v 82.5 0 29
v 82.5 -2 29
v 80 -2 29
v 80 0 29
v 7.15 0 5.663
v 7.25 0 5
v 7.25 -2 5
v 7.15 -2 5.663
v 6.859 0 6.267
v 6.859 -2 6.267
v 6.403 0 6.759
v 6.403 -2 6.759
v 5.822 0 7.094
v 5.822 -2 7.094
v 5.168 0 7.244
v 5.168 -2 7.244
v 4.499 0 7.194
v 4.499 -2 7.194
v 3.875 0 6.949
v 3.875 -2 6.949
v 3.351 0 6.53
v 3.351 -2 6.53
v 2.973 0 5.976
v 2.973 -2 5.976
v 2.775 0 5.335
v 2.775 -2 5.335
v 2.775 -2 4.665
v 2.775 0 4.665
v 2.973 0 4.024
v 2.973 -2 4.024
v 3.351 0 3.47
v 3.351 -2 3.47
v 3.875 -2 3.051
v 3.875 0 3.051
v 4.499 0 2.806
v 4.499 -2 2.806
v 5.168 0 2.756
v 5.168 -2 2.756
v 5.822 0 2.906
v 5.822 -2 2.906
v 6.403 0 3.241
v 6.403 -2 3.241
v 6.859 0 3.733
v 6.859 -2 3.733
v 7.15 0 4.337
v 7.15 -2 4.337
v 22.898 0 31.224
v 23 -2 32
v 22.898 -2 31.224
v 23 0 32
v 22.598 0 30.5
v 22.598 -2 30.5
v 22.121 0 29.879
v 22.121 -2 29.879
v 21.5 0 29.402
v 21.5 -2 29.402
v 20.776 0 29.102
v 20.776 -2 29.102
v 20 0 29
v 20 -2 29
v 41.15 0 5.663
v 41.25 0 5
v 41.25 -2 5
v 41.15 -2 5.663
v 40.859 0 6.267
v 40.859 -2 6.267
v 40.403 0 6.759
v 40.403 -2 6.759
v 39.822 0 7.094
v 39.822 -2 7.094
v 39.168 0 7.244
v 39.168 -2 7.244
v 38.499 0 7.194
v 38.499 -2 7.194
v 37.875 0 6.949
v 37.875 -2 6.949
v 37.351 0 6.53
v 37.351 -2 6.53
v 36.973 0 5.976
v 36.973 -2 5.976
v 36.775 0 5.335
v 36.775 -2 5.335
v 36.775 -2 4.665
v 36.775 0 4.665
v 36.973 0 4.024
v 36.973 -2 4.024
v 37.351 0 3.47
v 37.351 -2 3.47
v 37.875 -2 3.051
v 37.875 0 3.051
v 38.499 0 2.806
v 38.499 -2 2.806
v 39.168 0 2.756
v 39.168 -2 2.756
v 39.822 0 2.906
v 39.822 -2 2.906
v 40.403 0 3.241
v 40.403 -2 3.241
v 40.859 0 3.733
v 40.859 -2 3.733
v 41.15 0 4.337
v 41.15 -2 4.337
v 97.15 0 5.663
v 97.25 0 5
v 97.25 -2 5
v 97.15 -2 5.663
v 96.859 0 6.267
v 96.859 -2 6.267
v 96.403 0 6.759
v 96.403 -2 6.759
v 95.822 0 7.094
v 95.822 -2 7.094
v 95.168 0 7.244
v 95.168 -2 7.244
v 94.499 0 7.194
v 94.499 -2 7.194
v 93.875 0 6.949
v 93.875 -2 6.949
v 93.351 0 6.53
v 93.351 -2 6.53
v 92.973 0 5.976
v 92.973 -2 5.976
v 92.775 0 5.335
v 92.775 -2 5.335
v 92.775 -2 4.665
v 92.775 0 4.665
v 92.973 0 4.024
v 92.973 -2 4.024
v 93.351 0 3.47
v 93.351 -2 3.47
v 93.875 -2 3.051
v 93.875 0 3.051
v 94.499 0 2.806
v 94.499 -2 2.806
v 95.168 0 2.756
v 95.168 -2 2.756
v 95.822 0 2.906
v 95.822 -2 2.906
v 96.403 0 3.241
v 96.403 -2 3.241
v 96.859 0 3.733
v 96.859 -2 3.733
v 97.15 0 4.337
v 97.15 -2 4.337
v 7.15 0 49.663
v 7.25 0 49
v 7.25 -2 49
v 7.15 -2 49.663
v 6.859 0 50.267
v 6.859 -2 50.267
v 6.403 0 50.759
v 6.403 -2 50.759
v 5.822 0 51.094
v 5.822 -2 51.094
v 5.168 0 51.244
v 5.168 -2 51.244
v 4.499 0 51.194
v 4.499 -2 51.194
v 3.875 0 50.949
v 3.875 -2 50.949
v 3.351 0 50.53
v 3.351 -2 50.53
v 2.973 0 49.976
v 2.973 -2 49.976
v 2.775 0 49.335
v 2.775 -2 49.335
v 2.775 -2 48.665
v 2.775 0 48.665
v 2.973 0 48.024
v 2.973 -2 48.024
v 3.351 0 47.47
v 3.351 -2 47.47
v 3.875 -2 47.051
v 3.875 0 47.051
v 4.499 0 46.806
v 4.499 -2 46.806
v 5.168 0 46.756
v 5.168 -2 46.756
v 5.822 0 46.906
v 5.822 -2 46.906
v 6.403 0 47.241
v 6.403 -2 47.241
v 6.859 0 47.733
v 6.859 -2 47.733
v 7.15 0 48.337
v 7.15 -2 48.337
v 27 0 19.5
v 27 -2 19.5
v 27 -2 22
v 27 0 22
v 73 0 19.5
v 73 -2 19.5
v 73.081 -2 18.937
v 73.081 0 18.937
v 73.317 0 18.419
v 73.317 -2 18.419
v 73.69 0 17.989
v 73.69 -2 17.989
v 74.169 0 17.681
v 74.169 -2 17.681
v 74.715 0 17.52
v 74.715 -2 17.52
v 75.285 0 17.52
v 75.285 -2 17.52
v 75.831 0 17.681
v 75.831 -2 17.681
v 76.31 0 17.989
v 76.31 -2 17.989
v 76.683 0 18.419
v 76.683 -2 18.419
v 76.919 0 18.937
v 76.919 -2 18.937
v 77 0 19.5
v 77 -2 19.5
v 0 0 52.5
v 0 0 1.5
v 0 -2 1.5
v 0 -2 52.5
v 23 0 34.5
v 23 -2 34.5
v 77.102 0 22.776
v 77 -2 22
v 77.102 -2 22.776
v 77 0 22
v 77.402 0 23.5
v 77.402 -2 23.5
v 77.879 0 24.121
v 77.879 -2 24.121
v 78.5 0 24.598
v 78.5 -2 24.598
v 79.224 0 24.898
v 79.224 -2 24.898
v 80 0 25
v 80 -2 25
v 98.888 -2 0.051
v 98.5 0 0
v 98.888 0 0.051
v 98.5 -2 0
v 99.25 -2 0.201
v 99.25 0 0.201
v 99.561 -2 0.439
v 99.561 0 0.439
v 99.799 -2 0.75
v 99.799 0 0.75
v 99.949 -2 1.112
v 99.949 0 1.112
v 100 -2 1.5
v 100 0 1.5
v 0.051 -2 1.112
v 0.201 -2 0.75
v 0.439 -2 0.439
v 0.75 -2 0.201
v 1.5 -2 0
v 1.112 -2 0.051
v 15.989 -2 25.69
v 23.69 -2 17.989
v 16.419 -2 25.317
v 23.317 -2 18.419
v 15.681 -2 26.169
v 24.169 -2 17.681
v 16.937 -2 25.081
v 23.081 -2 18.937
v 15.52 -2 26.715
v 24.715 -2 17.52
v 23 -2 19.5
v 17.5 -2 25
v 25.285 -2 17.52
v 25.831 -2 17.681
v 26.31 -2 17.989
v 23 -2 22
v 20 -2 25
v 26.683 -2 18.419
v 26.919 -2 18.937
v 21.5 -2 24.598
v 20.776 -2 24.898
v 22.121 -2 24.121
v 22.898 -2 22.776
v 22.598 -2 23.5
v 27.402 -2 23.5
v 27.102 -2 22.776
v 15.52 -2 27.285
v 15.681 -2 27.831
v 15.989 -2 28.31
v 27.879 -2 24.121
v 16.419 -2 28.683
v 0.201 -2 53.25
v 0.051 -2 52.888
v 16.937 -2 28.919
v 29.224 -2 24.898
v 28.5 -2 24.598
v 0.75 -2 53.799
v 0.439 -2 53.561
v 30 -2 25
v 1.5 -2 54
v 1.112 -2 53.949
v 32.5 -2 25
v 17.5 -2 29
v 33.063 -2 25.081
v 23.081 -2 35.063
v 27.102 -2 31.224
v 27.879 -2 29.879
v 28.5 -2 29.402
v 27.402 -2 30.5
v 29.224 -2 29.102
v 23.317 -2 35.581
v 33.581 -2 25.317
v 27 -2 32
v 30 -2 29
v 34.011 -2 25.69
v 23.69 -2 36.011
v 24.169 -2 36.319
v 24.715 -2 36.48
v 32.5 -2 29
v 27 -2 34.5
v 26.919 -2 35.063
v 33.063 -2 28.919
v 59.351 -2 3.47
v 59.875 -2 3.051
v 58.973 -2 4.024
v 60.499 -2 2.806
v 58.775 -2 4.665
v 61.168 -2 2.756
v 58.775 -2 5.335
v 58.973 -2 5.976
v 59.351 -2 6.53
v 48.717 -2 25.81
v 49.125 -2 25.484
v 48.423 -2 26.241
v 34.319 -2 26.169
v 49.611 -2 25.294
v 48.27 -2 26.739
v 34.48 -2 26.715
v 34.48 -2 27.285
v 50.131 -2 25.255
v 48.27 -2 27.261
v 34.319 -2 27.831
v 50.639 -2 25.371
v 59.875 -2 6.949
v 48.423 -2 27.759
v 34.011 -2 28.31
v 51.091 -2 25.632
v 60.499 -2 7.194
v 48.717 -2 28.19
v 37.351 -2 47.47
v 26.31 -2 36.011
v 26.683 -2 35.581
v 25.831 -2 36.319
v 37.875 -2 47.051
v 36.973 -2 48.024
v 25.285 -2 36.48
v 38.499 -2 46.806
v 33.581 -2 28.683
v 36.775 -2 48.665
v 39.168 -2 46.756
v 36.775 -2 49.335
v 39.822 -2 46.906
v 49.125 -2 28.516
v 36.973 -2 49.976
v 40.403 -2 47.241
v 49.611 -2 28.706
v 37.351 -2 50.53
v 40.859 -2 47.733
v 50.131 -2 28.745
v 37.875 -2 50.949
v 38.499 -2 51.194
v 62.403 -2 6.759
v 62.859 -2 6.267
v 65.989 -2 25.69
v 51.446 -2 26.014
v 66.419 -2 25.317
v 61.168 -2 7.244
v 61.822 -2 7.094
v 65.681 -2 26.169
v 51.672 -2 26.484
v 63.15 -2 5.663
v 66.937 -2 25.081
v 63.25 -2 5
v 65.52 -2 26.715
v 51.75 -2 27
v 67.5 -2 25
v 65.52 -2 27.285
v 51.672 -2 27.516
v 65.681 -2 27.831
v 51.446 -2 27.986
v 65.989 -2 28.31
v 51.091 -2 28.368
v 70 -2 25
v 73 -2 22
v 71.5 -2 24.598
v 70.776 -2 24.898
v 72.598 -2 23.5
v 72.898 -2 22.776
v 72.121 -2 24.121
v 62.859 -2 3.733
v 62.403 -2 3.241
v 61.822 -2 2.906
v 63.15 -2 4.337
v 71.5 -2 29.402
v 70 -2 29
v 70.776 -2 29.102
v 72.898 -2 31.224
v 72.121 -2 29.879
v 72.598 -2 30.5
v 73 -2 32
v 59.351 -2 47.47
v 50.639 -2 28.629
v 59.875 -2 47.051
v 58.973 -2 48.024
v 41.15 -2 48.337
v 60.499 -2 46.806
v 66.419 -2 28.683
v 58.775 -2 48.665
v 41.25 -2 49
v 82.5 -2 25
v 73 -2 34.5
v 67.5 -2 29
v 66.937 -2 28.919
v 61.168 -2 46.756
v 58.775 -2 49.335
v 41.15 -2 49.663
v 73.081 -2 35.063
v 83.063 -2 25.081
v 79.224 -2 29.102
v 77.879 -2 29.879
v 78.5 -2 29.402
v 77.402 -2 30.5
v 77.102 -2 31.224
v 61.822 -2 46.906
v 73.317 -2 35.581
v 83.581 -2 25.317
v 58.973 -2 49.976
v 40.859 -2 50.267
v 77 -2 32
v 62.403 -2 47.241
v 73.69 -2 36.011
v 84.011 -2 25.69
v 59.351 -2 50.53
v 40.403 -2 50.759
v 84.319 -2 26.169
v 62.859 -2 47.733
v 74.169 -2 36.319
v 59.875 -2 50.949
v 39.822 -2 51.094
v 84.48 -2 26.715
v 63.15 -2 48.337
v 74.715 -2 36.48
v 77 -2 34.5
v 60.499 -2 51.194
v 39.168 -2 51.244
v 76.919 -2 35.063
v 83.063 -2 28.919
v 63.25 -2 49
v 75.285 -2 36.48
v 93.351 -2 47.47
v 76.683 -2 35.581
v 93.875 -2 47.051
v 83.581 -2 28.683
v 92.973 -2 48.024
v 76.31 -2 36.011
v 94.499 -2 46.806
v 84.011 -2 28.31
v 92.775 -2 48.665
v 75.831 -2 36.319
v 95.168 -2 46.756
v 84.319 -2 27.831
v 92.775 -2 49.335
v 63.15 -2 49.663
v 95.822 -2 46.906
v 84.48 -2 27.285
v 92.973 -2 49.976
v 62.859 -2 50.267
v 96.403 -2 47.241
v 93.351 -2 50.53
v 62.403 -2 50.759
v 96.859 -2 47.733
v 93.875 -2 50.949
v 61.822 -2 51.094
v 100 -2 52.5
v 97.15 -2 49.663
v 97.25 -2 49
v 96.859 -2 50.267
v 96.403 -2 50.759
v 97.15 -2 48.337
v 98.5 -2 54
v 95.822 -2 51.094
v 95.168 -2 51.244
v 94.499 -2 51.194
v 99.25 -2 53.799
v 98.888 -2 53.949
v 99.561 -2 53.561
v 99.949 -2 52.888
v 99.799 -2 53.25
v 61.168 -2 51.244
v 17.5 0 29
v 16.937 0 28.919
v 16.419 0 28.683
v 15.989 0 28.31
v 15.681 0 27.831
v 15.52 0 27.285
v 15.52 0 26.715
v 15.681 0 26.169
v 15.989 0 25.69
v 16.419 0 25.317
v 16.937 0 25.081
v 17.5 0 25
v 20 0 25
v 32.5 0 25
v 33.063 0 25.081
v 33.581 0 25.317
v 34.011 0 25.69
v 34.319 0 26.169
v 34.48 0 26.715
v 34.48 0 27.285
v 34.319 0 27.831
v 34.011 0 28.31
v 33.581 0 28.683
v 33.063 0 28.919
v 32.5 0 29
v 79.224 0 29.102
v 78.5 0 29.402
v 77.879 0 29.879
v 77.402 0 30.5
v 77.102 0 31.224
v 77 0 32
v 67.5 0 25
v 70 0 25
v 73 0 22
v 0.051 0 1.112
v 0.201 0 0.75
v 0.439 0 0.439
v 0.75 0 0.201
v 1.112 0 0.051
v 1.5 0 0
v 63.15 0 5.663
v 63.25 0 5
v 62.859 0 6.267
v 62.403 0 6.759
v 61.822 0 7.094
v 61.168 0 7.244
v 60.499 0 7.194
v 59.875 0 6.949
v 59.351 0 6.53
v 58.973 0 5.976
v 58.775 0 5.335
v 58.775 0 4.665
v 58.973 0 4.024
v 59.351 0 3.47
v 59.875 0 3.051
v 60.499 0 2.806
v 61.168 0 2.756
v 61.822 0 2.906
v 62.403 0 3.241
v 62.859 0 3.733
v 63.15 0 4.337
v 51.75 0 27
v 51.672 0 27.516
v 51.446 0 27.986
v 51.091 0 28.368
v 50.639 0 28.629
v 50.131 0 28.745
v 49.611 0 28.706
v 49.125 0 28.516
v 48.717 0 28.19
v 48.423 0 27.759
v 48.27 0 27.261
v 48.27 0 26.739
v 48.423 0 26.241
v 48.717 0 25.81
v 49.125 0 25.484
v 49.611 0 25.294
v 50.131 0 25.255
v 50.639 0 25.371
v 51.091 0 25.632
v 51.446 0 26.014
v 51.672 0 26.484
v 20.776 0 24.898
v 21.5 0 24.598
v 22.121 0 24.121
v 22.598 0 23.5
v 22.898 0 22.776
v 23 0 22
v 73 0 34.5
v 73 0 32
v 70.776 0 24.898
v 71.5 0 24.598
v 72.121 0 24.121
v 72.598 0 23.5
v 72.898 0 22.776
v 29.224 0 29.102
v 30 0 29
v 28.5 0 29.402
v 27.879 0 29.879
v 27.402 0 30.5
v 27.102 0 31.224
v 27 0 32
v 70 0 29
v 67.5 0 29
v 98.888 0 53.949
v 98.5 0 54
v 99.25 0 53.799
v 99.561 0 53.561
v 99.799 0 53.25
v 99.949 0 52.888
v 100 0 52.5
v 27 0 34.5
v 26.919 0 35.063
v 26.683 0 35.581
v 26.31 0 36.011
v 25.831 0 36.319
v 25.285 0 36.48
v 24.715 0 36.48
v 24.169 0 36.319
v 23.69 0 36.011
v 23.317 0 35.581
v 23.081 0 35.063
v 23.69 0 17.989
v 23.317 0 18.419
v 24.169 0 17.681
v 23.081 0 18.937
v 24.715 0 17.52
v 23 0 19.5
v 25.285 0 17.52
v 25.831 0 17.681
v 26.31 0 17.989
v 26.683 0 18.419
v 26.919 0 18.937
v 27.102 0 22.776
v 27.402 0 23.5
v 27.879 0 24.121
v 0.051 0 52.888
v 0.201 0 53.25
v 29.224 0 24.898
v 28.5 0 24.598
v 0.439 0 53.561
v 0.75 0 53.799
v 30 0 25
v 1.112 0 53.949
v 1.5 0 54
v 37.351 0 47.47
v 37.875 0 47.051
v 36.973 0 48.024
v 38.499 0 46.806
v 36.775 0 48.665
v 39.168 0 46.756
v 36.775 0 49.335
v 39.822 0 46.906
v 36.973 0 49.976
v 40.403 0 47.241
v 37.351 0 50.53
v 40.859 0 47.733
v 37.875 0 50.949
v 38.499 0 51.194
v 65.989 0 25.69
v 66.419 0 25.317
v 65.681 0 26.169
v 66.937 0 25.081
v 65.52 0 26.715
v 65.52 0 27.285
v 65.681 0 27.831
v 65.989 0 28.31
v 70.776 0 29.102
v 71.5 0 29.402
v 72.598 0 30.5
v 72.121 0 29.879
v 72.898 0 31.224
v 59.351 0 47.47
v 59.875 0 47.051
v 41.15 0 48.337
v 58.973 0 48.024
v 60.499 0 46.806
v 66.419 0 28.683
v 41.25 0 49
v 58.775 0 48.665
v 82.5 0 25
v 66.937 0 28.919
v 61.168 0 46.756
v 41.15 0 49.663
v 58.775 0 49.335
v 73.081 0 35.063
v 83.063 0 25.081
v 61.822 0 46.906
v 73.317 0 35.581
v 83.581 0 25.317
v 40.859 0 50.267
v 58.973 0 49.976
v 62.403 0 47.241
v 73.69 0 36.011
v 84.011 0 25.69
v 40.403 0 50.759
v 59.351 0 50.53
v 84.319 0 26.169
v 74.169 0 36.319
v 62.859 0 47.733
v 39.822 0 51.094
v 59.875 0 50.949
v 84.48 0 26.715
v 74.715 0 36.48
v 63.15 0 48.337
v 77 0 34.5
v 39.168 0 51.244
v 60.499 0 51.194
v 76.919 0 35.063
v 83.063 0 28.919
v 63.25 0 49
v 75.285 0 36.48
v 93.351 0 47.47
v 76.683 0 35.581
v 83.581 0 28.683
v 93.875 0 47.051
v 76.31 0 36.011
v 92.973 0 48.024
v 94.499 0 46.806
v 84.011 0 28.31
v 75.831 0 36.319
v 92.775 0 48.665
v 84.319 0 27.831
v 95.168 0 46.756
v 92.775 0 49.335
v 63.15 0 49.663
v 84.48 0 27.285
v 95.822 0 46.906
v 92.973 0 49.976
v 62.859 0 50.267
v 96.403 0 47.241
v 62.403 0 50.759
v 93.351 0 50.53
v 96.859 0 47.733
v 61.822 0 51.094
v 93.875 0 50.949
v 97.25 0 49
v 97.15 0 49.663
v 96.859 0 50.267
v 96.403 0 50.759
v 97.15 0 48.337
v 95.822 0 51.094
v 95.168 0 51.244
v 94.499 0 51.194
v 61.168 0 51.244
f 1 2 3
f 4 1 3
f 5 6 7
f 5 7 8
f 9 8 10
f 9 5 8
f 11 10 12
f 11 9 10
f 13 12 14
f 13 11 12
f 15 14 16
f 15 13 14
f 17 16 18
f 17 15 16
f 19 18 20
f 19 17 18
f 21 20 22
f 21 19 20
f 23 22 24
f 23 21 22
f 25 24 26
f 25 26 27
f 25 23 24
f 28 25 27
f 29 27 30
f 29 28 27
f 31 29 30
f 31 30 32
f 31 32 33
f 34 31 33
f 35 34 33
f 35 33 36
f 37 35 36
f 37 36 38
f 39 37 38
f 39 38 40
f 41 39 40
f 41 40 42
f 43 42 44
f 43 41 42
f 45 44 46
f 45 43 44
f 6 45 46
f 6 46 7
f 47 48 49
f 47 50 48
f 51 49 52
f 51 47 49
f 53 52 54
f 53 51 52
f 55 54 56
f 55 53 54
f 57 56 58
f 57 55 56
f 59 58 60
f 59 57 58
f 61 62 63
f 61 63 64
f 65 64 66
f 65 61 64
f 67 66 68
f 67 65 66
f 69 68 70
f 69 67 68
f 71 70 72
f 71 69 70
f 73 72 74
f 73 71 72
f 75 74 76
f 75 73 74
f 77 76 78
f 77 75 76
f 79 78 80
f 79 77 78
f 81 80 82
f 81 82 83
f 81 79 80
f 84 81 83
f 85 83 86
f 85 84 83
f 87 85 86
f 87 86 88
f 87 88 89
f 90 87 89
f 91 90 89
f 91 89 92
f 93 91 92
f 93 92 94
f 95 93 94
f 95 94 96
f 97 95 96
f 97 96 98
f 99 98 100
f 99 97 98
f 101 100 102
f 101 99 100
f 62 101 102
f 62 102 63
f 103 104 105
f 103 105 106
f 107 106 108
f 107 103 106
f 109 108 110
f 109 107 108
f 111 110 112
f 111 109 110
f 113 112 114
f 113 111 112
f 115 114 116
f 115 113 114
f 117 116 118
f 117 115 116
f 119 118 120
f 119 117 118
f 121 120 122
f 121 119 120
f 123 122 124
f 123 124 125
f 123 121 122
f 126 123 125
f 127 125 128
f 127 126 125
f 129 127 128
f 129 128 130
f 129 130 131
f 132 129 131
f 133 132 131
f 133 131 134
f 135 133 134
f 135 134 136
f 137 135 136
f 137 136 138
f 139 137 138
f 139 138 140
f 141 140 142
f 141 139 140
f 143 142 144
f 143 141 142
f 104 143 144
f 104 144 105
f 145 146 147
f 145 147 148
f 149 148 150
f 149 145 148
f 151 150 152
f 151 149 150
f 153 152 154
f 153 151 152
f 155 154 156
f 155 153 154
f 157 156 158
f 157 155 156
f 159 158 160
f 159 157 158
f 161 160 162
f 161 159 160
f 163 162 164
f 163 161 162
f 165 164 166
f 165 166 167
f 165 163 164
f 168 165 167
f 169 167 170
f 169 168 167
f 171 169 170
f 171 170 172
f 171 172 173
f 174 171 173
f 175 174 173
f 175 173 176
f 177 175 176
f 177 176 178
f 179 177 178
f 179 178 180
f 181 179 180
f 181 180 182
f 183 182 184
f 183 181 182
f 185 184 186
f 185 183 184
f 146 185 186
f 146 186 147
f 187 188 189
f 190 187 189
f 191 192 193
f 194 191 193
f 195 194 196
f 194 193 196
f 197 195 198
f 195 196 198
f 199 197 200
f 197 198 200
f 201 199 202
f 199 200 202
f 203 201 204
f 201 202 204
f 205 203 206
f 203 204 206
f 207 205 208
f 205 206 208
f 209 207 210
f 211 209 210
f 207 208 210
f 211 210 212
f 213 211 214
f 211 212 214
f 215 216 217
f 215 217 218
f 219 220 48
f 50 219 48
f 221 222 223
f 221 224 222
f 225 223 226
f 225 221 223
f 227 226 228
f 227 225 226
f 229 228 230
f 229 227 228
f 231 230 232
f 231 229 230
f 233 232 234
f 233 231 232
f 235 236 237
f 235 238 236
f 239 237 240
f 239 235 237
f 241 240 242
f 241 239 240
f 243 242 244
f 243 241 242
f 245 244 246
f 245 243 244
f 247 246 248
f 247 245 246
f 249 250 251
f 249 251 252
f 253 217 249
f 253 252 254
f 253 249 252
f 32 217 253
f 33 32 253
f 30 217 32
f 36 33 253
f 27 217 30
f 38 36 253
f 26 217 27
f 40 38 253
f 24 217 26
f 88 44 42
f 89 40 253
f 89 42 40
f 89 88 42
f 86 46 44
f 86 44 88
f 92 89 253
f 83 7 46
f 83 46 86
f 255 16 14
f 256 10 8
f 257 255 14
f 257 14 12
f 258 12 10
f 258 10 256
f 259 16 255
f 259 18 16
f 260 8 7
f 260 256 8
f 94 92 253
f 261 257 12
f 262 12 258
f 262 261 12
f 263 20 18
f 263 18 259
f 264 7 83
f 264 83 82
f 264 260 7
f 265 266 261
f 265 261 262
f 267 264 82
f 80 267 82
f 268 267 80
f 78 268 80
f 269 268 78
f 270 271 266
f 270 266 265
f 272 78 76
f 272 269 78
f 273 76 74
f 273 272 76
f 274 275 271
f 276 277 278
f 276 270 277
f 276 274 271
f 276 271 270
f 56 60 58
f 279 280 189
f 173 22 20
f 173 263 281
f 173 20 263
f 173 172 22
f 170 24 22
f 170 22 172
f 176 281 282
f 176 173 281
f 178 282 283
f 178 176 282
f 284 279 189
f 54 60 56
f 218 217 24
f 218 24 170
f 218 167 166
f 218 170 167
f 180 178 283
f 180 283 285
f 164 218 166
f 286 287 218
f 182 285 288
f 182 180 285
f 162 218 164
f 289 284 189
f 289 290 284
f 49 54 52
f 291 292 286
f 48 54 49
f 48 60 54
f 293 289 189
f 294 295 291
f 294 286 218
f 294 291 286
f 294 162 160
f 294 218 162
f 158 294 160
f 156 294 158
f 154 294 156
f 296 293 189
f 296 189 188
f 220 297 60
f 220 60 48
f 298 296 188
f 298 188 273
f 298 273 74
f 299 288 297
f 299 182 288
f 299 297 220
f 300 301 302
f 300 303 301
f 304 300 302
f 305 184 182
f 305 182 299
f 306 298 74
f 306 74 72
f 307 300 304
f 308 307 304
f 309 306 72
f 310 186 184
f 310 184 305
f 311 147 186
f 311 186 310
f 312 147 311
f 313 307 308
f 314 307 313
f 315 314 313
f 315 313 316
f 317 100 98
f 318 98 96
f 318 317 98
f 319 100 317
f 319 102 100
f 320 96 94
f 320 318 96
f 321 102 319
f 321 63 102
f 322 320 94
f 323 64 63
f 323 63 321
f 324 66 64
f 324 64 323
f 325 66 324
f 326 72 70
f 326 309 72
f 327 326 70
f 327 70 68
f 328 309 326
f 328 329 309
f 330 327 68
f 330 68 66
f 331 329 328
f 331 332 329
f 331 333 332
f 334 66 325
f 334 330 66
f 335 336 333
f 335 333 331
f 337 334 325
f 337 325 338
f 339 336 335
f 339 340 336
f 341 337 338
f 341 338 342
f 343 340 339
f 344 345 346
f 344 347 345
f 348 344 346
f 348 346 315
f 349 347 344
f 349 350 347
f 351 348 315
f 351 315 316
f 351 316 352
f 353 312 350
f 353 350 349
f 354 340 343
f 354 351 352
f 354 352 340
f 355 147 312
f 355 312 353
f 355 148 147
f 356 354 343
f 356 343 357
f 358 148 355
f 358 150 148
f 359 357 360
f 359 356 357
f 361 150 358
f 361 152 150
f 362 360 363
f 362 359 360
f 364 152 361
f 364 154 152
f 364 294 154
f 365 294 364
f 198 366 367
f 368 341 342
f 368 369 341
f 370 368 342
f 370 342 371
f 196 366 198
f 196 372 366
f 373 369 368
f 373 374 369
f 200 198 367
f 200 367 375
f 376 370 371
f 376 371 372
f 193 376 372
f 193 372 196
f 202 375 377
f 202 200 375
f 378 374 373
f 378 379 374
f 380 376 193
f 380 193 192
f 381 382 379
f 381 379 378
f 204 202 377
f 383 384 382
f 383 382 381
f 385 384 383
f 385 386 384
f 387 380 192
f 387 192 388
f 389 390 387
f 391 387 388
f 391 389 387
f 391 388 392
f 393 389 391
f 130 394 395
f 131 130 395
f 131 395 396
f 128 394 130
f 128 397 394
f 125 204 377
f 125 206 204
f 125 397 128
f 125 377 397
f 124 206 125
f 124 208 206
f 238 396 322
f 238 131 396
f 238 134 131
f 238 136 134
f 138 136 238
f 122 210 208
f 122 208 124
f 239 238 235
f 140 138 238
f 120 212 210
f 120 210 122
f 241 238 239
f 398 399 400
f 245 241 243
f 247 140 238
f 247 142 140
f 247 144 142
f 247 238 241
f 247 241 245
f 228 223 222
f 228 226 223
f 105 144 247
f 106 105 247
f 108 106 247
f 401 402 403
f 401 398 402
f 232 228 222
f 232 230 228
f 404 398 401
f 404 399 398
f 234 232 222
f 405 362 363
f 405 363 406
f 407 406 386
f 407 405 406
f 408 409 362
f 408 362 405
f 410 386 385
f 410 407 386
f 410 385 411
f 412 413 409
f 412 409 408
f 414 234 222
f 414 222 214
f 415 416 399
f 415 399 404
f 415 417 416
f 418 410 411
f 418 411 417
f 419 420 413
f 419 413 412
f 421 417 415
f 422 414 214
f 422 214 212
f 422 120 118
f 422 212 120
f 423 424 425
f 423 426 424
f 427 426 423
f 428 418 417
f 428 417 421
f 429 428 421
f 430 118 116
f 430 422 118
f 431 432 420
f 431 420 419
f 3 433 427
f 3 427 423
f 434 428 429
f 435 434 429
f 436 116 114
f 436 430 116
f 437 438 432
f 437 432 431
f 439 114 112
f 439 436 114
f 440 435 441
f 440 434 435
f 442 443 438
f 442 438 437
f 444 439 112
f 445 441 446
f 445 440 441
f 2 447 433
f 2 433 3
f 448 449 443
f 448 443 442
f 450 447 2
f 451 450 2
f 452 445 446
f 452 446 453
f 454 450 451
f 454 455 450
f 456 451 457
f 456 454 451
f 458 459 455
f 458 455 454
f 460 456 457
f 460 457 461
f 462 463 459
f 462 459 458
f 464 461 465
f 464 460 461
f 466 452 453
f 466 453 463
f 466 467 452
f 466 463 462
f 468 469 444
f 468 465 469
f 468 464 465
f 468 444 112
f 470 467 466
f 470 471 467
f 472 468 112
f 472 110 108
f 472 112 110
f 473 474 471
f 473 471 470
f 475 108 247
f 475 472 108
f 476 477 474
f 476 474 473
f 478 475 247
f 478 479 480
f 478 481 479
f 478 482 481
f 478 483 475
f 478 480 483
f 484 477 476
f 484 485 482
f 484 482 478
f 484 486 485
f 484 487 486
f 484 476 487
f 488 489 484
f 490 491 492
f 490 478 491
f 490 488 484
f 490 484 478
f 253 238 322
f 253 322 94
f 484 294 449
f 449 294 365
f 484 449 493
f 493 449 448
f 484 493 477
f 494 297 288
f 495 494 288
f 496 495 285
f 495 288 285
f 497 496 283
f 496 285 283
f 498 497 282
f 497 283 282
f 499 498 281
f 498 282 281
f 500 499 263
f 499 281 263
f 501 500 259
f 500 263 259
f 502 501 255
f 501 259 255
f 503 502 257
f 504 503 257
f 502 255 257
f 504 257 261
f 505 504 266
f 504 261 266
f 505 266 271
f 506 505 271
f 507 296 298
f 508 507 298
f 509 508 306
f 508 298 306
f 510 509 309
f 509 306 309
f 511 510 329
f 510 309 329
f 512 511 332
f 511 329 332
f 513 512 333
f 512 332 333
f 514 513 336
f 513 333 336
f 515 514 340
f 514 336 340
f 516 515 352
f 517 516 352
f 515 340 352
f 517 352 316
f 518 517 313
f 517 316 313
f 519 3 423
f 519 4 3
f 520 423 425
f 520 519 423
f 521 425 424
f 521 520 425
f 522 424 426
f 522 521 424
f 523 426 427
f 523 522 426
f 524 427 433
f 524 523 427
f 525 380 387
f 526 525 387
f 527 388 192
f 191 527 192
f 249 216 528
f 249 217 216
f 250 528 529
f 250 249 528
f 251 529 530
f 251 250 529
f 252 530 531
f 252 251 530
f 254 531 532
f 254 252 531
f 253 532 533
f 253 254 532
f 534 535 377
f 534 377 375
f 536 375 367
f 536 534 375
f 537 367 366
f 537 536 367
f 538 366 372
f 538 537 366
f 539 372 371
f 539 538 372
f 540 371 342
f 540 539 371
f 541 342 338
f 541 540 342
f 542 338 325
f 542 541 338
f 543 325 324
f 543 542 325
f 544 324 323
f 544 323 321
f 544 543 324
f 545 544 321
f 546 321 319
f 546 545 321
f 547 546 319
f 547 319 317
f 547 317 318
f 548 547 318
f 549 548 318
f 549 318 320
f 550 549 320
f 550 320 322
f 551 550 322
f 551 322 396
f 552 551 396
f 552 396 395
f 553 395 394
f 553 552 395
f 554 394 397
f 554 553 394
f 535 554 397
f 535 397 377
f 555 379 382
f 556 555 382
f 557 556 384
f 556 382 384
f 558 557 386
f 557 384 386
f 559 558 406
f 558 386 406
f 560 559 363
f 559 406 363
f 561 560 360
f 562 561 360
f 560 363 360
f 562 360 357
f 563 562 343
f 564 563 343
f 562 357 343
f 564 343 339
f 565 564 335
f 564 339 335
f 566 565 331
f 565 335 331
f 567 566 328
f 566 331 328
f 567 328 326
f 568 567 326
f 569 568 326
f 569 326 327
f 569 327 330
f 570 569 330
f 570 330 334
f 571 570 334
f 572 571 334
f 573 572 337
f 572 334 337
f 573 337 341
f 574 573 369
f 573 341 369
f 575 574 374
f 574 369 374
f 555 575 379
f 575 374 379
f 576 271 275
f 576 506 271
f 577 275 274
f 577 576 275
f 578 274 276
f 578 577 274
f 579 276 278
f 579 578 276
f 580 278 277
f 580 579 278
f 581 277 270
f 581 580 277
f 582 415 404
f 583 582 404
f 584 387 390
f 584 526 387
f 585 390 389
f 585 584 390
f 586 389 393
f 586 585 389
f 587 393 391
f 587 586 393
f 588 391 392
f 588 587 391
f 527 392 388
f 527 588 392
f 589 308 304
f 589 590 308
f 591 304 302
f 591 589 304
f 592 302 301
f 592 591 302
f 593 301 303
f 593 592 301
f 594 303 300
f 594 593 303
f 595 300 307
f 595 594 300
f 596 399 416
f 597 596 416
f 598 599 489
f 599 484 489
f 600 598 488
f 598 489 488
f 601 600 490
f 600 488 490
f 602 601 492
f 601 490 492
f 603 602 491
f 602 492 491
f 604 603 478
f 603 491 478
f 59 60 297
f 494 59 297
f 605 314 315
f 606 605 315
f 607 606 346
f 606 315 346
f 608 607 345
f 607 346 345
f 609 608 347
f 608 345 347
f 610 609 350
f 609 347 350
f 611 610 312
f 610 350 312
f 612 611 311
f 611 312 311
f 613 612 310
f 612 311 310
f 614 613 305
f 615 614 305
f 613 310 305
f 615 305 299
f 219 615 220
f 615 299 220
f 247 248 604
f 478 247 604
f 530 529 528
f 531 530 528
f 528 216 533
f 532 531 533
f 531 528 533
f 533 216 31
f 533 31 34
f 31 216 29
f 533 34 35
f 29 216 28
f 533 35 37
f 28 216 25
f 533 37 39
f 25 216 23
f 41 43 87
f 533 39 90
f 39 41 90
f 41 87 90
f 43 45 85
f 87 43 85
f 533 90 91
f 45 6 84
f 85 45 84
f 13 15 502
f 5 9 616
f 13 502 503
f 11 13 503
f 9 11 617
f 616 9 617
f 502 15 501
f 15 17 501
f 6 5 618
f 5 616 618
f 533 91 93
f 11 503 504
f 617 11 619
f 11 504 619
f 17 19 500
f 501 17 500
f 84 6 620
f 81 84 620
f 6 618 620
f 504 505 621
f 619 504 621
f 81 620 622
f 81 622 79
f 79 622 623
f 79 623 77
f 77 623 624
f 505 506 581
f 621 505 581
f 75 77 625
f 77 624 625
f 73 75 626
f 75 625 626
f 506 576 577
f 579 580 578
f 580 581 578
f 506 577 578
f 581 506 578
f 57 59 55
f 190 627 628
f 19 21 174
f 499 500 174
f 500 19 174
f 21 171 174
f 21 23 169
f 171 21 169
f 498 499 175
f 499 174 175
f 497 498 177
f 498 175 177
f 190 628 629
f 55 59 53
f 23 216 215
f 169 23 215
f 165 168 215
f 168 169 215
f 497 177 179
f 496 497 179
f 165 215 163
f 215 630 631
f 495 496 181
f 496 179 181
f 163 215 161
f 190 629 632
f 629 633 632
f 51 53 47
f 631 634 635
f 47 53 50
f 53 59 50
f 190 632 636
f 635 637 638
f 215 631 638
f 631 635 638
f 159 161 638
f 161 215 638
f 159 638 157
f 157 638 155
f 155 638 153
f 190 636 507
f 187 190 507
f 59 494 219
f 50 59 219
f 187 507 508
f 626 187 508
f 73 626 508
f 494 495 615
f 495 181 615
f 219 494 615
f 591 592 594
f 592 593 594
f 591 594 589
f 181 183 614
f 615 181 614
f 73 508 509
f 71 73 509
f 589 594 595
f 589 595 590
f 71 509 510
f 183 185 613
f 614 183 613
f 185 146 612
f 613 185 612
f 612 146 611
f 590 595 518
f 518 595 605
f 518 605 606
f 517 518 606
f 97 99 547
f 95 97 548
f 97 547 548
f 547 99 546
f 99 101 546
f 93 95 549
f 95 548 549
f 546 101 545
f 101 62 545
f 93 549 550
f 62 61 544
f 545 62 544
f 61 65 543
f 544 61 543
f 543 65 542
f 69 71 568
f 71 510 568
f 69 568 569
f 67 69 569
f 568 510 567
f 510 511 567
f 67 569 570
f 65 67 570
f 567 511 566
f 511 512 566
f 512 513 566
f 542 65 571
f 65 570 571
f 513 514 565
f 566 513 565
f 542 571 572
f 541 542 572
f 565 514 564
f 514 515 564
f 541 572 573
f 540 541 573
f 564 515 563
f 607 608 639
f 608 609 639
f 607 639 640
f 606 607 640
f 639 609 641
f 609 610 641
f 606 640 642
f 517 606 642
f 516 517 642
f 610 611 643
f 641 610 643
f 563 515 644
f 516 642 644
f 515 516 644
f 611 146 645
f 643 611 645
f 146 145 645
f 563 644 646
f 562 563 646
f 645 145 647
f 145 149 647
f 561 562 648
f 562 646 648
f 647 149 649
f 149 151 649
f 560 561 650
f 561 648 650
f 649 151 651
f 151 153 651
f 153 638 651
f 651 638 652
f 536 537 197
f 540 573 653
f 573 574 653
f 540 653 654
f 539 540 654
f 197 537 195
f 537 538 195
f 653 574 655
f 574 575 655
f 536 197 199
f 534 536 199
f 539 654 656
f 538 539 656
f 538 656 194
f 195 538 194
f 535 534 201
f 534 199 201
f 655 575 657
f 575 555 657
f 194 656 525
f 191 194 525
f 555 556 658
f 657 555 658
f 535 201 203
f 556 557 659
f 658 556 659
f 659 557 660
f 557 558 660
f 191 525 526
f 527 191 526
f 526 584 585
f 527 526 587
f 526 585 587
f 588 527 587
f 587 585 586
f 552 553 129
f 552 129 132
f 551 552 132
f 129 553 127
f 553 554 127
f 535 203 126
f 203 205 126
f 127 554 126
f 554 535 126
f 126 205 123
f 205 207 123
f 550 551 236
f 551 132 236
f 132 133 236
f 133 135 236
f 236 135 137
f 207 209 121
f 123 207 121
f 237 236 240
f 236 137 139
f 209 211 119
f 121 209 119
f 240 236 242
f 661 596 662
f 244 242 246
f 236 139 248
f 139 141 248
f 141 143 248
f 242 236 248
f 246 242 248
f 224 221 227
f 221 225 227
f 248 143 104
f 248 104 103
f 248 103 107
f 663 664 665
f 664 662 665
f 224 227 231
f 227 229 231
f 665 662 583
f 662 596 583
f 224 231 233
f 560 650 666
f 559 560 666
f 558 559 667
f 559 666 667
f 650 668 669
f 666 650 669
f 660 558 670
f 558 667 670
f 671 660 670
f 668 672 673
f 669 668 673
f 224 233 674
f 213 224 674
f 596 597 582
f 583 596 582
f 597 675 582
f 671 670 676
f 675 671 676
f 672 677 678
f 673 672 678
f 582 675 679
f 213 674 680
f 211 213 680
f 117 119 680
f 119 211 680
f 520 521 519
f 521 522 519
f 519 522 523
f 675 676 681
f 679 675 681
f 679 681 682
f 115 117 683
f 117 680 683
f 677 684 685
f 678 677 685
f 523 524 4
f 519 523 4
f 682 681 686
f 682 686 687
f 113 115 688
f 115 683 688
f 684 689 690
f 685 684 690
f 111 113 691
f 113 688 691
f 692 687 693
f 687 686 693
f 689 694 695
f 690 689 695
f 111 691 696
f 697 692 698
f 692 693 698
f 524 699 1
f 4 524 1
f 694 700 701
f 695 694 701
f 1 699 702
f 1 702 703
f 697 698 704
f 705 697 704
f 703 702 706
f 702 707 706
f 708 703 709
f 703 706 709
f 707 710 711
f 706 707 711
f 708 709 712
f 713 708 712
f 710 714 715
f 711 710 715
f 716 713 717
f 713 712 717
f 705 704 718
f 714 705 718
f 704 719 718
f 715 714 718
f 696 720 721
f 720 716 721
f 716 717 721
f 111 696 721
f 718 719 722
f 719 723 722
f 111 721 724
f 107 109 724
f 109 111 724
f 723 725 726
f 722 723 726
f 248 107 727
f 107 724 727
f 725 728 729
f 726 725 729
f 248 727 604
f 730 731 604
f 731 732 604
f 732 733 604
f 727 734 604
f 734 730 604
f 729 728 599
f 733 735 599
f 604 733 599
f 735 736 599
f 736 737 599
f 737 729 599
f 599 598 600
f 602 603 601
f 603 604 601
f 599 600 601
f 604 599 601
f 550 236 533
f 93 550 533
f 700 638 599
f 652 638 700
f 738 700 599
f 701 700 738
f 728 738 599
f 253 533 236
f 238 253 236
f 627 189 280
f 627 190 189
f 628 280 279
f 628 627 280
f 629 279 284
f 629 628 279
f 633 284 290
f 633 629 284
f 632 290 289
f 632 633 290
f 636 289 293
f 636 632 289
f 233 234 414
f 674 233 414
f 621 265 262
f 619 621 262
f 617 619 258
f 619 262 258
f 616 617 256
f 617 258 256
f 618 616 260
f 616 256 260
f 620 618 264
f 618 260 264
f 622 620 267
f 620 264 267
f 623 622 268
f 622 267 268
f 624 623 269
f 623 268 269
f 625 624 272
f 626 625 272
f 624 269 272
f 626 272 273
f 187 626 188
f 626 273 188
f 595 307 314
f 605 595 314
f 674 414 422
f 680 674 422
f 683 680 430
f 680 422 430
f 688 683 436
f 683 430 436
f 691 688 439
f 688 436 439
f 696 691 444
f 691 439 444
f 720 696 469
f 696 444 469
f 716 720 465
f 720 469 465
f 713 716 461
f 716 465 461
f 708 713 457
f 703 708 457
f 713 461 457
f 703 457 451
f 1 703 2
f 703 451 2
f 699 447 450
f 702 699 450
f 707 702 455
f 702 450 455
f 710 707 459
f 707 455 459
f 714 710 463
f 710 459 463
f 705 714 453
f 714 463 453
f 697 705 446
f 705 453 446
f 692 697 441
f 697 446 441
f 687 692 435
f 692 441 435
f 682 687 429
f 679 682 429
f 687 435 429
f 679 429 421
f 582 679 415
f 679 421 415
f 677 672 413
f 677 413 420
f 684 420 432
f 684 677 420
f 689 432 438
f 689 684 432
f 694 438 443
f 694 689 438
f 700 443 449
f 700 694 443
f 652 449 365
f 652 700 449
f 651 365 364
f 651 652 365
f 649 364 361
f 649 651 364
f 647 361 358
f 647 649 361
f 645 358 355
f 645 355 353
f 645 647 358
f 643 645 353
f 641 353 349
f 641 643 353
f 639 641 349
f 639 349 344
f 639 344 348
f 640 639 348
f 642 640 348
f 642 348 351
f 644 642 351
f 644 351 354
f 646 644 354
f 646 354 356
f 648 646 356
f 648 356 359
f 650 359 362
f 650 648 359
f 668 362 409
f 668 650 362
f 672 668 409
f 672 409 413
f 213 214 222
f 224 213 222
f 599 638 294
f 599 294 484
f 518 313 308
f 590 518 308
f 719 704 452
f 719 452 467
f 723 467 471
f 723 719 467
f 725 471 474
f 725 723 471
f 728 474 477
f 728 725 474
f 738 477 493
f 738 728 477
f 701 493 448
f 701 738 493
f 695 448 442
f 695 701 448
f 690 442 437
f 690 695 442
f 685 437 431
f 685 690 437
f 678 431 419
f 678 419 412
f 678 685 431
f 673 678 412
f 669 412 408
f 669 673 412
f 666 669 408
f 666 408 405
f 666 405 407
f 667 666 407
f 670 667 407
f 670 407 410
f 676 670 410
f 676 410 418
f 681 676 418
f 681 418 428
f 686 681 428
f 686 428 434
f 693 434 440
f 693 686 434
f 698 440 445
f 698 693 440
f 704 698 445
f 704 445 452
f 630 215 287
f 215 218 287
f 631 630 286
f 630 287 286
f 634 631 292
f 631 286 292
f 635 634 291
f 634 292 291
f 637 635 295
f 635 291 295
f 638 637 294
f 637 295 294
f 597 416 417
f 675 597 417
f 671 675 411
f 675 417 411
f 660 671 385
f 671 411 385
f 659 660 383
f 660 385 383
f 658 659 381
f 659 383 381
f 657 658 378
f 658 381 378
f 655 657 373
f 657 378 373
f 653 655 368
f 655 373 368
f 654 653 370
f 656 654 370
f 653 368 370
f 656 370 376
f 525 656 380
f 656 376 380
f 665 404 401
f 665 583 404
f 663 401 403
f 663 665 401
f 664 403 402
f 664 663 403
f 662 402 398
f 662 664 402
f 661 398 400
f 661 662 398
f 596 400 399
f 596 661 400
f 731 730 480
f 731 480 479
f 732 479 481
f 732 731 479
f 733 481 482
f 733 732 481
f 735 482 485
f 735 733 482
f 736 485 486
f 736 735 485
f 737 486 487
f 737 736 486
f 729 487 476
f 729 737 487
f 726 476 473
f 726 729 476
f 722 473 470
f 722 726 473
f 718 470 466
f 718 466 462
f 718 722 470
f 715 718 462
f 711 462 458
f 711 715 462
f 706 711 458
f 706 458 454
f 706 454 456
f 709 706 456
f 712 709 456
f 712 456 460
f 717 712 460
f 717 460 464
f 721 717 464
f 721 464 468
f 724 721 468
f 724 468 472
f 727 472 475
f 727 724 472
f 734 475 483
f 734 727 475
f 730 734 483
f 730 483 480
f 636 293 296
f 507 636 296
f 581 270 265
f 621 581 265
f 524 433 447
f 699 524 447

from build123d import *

# Parameters (mm, degrees)
F0_W     = 100
F0_H     = 54
F0_R     = 2.25
F1_DEPTH = 2
F2_W     = 2
F2_H     = 2
F2_R     = 1.75
F3_DEPTH = 2
F4_R     = 3
F5_R     = 1.5


# Not quite as in the source:
# - a feature names something its author has since deleted; it is built from what else it names


with BuildPart() as f1:
    # F0 (on Front) → F1 (new body)
    with BuildSketch(Plane.XZ):
        with Locations((50, 27)):
            Rectangle(F0_W, F0_H)
        with Locations((5, 5)):
            Circle(F0_R, mode=Mode.SUBTRACT)
        with Locations((39, 5)):
            Circle(F0_R, mode=Mode.SUBTRACT)
        with Locations((61, 5)):
            Circle(F0_R, mode=Mode.SUBTRACT)
        with Locations((95, 5)):
            Circle(F0_R, mode=Mode.SUBTRACT)
        with Locations((5, 49)):
            Circle(F0_R, mode=Mode.SUBTRACT)
        with Locations((39, 49)):
            Circle(F0_R, mode=Mode.SUBTRACT)
        with Locations((61, 49)):
            Circle(F0_R, mode=Mode.SUBTRACT)
        with Locations((95, 49)):
            Circle(F0_R, mode=Mode.SUBTRACT)
    extrude(amount=F1_DEPTH)

    # F2 (on face) → F3 (cut)
    with BuildSketch(Plane.XZ.offset(2)):
        with Locations((24, 28)):
            Rectangle(F2_W, F2_H)
        with BuildLine():
            Line((23, 25), (23, 27))
            Line((23, 27), (23, 29))
            Line((23, 29), (17.5, 29))
            ThreePointArc((17.5, 29), (15.5, 27), (17.5, 25))
            Line((17.5, 25), (23, 25))
        make_face()
        with Locations((24, 26)):
            Rectangle(F2_W, F2_H)
        with Locations((26, 28)):
            Rectangle(F2_W, F2_H)
        with Locations((26, 26)):
            Rectangle(F2_W, F2_H)
        with BuildLine():
            Line((23, 34.5), (23, 29))
            Line((23, 29), (25, 29))
            Line((25, 29), (27, 29))
            Line((27, 29), (27, 34.5))
            ThreePointArc((27, 34.5), (25, 36.5), (23, 34.5))
        make_face()
        with BuildLine():
            Line((25, 25), (23, 25))
            Line((23, 25), (23, 19.5))
            ThreePointArc((23, 19.5), (25, 17.5), (27, 19.5))
            Line((27, 19.5), (27, 25))
            Line((27, 25), (25, 25))
        make_face()
        with BuildLine():
            Line((27, 29), (27, 27))
            Line((27, 27), (27, 25))
            Line((27, 25), (32.5, 25))
            ThreePointArc((32.5, 25), (34.5, 27), (32.5, 29))
            Line((32.5, 29), (27, 29))
        make_face()
        with Locations((50, 27)):
            Circle(F2_R)
        with Locations((74, 28)):
            Rectangle(F2_W, F2_H)
        with BuildLine():
            Line((73, 25), (73, 27))
            Line((73, 27), (73, 29))
            Line((73, 29), (67.5, 29))
            ThreePointArc((67.5, 29), (65.5, 27), (67.5, 25))
            Line((67.5, 25), (73, 25))
        make_face()
        with Locations((74, 26)):
            Rectangle(F2_W, F2_H)
        with Locations((76, 28)):
            Rectangle(F2_W, F2_H)
        with Locations((76, 26)):
            Rectangle(F2_W, F2_H)
        with BuildLine():
            Line((73, 34.5), (73, 29))
            Line((73, 29), (75, 29))
            Line((75, 29), (77, 29))
            Line((77, 29), (77, 34.5))
            ThreePointArc((77, 34.5), (75, 36.5), (73, 34.5))
        make_face()
        with BuildLine():
            Line((75, 25), (73, 25))
            Line((73, 25), (73, 19.5))
            ThreePointArc((73, 19.5), (75, 17.5), (77, 19.5))
            Line((77, 19.5), (77, 25))
            Line((77, 25), (75, 25))
        make_face()
        with BuildLine():
            Line((77, 29), (77, 27))
            Line((77, 27), (77, 25))
            Line((77, 25), (82.5, 25))
            ThreePointArc((82.5, 25), (84.5, 27), (82.5, 29))
            Line((82.5, 29), (77, 29))
        make_face()
    extrude(amount=-F3_DEPTH, mode=Mode.SUBTRACT)

    # F4
    f4_edges = [f1.edges().sort_by_distance(p)[0] for p in [
        (23, -1, 29),
        (23, -1, 25),
        (27, -1, 25),
        (27, -1, 29),
        (73, -1, 29),
        (77, -1, 29),
        (77, -1, 25),
        (73, -1, 25),
    ]]
    fillet(f4_edges, radius=F4_R)

    # F5
    f5_edges = [f1.edges().sort_by_distance(p)[0] for p in [
        (0, -1, 54),
        (0, -1, 0),
        (100, -1, 54),
        (100, -1, 0),
    ]]
    fillet(f5_edges, radius=F5_R)


solid = f1.part
